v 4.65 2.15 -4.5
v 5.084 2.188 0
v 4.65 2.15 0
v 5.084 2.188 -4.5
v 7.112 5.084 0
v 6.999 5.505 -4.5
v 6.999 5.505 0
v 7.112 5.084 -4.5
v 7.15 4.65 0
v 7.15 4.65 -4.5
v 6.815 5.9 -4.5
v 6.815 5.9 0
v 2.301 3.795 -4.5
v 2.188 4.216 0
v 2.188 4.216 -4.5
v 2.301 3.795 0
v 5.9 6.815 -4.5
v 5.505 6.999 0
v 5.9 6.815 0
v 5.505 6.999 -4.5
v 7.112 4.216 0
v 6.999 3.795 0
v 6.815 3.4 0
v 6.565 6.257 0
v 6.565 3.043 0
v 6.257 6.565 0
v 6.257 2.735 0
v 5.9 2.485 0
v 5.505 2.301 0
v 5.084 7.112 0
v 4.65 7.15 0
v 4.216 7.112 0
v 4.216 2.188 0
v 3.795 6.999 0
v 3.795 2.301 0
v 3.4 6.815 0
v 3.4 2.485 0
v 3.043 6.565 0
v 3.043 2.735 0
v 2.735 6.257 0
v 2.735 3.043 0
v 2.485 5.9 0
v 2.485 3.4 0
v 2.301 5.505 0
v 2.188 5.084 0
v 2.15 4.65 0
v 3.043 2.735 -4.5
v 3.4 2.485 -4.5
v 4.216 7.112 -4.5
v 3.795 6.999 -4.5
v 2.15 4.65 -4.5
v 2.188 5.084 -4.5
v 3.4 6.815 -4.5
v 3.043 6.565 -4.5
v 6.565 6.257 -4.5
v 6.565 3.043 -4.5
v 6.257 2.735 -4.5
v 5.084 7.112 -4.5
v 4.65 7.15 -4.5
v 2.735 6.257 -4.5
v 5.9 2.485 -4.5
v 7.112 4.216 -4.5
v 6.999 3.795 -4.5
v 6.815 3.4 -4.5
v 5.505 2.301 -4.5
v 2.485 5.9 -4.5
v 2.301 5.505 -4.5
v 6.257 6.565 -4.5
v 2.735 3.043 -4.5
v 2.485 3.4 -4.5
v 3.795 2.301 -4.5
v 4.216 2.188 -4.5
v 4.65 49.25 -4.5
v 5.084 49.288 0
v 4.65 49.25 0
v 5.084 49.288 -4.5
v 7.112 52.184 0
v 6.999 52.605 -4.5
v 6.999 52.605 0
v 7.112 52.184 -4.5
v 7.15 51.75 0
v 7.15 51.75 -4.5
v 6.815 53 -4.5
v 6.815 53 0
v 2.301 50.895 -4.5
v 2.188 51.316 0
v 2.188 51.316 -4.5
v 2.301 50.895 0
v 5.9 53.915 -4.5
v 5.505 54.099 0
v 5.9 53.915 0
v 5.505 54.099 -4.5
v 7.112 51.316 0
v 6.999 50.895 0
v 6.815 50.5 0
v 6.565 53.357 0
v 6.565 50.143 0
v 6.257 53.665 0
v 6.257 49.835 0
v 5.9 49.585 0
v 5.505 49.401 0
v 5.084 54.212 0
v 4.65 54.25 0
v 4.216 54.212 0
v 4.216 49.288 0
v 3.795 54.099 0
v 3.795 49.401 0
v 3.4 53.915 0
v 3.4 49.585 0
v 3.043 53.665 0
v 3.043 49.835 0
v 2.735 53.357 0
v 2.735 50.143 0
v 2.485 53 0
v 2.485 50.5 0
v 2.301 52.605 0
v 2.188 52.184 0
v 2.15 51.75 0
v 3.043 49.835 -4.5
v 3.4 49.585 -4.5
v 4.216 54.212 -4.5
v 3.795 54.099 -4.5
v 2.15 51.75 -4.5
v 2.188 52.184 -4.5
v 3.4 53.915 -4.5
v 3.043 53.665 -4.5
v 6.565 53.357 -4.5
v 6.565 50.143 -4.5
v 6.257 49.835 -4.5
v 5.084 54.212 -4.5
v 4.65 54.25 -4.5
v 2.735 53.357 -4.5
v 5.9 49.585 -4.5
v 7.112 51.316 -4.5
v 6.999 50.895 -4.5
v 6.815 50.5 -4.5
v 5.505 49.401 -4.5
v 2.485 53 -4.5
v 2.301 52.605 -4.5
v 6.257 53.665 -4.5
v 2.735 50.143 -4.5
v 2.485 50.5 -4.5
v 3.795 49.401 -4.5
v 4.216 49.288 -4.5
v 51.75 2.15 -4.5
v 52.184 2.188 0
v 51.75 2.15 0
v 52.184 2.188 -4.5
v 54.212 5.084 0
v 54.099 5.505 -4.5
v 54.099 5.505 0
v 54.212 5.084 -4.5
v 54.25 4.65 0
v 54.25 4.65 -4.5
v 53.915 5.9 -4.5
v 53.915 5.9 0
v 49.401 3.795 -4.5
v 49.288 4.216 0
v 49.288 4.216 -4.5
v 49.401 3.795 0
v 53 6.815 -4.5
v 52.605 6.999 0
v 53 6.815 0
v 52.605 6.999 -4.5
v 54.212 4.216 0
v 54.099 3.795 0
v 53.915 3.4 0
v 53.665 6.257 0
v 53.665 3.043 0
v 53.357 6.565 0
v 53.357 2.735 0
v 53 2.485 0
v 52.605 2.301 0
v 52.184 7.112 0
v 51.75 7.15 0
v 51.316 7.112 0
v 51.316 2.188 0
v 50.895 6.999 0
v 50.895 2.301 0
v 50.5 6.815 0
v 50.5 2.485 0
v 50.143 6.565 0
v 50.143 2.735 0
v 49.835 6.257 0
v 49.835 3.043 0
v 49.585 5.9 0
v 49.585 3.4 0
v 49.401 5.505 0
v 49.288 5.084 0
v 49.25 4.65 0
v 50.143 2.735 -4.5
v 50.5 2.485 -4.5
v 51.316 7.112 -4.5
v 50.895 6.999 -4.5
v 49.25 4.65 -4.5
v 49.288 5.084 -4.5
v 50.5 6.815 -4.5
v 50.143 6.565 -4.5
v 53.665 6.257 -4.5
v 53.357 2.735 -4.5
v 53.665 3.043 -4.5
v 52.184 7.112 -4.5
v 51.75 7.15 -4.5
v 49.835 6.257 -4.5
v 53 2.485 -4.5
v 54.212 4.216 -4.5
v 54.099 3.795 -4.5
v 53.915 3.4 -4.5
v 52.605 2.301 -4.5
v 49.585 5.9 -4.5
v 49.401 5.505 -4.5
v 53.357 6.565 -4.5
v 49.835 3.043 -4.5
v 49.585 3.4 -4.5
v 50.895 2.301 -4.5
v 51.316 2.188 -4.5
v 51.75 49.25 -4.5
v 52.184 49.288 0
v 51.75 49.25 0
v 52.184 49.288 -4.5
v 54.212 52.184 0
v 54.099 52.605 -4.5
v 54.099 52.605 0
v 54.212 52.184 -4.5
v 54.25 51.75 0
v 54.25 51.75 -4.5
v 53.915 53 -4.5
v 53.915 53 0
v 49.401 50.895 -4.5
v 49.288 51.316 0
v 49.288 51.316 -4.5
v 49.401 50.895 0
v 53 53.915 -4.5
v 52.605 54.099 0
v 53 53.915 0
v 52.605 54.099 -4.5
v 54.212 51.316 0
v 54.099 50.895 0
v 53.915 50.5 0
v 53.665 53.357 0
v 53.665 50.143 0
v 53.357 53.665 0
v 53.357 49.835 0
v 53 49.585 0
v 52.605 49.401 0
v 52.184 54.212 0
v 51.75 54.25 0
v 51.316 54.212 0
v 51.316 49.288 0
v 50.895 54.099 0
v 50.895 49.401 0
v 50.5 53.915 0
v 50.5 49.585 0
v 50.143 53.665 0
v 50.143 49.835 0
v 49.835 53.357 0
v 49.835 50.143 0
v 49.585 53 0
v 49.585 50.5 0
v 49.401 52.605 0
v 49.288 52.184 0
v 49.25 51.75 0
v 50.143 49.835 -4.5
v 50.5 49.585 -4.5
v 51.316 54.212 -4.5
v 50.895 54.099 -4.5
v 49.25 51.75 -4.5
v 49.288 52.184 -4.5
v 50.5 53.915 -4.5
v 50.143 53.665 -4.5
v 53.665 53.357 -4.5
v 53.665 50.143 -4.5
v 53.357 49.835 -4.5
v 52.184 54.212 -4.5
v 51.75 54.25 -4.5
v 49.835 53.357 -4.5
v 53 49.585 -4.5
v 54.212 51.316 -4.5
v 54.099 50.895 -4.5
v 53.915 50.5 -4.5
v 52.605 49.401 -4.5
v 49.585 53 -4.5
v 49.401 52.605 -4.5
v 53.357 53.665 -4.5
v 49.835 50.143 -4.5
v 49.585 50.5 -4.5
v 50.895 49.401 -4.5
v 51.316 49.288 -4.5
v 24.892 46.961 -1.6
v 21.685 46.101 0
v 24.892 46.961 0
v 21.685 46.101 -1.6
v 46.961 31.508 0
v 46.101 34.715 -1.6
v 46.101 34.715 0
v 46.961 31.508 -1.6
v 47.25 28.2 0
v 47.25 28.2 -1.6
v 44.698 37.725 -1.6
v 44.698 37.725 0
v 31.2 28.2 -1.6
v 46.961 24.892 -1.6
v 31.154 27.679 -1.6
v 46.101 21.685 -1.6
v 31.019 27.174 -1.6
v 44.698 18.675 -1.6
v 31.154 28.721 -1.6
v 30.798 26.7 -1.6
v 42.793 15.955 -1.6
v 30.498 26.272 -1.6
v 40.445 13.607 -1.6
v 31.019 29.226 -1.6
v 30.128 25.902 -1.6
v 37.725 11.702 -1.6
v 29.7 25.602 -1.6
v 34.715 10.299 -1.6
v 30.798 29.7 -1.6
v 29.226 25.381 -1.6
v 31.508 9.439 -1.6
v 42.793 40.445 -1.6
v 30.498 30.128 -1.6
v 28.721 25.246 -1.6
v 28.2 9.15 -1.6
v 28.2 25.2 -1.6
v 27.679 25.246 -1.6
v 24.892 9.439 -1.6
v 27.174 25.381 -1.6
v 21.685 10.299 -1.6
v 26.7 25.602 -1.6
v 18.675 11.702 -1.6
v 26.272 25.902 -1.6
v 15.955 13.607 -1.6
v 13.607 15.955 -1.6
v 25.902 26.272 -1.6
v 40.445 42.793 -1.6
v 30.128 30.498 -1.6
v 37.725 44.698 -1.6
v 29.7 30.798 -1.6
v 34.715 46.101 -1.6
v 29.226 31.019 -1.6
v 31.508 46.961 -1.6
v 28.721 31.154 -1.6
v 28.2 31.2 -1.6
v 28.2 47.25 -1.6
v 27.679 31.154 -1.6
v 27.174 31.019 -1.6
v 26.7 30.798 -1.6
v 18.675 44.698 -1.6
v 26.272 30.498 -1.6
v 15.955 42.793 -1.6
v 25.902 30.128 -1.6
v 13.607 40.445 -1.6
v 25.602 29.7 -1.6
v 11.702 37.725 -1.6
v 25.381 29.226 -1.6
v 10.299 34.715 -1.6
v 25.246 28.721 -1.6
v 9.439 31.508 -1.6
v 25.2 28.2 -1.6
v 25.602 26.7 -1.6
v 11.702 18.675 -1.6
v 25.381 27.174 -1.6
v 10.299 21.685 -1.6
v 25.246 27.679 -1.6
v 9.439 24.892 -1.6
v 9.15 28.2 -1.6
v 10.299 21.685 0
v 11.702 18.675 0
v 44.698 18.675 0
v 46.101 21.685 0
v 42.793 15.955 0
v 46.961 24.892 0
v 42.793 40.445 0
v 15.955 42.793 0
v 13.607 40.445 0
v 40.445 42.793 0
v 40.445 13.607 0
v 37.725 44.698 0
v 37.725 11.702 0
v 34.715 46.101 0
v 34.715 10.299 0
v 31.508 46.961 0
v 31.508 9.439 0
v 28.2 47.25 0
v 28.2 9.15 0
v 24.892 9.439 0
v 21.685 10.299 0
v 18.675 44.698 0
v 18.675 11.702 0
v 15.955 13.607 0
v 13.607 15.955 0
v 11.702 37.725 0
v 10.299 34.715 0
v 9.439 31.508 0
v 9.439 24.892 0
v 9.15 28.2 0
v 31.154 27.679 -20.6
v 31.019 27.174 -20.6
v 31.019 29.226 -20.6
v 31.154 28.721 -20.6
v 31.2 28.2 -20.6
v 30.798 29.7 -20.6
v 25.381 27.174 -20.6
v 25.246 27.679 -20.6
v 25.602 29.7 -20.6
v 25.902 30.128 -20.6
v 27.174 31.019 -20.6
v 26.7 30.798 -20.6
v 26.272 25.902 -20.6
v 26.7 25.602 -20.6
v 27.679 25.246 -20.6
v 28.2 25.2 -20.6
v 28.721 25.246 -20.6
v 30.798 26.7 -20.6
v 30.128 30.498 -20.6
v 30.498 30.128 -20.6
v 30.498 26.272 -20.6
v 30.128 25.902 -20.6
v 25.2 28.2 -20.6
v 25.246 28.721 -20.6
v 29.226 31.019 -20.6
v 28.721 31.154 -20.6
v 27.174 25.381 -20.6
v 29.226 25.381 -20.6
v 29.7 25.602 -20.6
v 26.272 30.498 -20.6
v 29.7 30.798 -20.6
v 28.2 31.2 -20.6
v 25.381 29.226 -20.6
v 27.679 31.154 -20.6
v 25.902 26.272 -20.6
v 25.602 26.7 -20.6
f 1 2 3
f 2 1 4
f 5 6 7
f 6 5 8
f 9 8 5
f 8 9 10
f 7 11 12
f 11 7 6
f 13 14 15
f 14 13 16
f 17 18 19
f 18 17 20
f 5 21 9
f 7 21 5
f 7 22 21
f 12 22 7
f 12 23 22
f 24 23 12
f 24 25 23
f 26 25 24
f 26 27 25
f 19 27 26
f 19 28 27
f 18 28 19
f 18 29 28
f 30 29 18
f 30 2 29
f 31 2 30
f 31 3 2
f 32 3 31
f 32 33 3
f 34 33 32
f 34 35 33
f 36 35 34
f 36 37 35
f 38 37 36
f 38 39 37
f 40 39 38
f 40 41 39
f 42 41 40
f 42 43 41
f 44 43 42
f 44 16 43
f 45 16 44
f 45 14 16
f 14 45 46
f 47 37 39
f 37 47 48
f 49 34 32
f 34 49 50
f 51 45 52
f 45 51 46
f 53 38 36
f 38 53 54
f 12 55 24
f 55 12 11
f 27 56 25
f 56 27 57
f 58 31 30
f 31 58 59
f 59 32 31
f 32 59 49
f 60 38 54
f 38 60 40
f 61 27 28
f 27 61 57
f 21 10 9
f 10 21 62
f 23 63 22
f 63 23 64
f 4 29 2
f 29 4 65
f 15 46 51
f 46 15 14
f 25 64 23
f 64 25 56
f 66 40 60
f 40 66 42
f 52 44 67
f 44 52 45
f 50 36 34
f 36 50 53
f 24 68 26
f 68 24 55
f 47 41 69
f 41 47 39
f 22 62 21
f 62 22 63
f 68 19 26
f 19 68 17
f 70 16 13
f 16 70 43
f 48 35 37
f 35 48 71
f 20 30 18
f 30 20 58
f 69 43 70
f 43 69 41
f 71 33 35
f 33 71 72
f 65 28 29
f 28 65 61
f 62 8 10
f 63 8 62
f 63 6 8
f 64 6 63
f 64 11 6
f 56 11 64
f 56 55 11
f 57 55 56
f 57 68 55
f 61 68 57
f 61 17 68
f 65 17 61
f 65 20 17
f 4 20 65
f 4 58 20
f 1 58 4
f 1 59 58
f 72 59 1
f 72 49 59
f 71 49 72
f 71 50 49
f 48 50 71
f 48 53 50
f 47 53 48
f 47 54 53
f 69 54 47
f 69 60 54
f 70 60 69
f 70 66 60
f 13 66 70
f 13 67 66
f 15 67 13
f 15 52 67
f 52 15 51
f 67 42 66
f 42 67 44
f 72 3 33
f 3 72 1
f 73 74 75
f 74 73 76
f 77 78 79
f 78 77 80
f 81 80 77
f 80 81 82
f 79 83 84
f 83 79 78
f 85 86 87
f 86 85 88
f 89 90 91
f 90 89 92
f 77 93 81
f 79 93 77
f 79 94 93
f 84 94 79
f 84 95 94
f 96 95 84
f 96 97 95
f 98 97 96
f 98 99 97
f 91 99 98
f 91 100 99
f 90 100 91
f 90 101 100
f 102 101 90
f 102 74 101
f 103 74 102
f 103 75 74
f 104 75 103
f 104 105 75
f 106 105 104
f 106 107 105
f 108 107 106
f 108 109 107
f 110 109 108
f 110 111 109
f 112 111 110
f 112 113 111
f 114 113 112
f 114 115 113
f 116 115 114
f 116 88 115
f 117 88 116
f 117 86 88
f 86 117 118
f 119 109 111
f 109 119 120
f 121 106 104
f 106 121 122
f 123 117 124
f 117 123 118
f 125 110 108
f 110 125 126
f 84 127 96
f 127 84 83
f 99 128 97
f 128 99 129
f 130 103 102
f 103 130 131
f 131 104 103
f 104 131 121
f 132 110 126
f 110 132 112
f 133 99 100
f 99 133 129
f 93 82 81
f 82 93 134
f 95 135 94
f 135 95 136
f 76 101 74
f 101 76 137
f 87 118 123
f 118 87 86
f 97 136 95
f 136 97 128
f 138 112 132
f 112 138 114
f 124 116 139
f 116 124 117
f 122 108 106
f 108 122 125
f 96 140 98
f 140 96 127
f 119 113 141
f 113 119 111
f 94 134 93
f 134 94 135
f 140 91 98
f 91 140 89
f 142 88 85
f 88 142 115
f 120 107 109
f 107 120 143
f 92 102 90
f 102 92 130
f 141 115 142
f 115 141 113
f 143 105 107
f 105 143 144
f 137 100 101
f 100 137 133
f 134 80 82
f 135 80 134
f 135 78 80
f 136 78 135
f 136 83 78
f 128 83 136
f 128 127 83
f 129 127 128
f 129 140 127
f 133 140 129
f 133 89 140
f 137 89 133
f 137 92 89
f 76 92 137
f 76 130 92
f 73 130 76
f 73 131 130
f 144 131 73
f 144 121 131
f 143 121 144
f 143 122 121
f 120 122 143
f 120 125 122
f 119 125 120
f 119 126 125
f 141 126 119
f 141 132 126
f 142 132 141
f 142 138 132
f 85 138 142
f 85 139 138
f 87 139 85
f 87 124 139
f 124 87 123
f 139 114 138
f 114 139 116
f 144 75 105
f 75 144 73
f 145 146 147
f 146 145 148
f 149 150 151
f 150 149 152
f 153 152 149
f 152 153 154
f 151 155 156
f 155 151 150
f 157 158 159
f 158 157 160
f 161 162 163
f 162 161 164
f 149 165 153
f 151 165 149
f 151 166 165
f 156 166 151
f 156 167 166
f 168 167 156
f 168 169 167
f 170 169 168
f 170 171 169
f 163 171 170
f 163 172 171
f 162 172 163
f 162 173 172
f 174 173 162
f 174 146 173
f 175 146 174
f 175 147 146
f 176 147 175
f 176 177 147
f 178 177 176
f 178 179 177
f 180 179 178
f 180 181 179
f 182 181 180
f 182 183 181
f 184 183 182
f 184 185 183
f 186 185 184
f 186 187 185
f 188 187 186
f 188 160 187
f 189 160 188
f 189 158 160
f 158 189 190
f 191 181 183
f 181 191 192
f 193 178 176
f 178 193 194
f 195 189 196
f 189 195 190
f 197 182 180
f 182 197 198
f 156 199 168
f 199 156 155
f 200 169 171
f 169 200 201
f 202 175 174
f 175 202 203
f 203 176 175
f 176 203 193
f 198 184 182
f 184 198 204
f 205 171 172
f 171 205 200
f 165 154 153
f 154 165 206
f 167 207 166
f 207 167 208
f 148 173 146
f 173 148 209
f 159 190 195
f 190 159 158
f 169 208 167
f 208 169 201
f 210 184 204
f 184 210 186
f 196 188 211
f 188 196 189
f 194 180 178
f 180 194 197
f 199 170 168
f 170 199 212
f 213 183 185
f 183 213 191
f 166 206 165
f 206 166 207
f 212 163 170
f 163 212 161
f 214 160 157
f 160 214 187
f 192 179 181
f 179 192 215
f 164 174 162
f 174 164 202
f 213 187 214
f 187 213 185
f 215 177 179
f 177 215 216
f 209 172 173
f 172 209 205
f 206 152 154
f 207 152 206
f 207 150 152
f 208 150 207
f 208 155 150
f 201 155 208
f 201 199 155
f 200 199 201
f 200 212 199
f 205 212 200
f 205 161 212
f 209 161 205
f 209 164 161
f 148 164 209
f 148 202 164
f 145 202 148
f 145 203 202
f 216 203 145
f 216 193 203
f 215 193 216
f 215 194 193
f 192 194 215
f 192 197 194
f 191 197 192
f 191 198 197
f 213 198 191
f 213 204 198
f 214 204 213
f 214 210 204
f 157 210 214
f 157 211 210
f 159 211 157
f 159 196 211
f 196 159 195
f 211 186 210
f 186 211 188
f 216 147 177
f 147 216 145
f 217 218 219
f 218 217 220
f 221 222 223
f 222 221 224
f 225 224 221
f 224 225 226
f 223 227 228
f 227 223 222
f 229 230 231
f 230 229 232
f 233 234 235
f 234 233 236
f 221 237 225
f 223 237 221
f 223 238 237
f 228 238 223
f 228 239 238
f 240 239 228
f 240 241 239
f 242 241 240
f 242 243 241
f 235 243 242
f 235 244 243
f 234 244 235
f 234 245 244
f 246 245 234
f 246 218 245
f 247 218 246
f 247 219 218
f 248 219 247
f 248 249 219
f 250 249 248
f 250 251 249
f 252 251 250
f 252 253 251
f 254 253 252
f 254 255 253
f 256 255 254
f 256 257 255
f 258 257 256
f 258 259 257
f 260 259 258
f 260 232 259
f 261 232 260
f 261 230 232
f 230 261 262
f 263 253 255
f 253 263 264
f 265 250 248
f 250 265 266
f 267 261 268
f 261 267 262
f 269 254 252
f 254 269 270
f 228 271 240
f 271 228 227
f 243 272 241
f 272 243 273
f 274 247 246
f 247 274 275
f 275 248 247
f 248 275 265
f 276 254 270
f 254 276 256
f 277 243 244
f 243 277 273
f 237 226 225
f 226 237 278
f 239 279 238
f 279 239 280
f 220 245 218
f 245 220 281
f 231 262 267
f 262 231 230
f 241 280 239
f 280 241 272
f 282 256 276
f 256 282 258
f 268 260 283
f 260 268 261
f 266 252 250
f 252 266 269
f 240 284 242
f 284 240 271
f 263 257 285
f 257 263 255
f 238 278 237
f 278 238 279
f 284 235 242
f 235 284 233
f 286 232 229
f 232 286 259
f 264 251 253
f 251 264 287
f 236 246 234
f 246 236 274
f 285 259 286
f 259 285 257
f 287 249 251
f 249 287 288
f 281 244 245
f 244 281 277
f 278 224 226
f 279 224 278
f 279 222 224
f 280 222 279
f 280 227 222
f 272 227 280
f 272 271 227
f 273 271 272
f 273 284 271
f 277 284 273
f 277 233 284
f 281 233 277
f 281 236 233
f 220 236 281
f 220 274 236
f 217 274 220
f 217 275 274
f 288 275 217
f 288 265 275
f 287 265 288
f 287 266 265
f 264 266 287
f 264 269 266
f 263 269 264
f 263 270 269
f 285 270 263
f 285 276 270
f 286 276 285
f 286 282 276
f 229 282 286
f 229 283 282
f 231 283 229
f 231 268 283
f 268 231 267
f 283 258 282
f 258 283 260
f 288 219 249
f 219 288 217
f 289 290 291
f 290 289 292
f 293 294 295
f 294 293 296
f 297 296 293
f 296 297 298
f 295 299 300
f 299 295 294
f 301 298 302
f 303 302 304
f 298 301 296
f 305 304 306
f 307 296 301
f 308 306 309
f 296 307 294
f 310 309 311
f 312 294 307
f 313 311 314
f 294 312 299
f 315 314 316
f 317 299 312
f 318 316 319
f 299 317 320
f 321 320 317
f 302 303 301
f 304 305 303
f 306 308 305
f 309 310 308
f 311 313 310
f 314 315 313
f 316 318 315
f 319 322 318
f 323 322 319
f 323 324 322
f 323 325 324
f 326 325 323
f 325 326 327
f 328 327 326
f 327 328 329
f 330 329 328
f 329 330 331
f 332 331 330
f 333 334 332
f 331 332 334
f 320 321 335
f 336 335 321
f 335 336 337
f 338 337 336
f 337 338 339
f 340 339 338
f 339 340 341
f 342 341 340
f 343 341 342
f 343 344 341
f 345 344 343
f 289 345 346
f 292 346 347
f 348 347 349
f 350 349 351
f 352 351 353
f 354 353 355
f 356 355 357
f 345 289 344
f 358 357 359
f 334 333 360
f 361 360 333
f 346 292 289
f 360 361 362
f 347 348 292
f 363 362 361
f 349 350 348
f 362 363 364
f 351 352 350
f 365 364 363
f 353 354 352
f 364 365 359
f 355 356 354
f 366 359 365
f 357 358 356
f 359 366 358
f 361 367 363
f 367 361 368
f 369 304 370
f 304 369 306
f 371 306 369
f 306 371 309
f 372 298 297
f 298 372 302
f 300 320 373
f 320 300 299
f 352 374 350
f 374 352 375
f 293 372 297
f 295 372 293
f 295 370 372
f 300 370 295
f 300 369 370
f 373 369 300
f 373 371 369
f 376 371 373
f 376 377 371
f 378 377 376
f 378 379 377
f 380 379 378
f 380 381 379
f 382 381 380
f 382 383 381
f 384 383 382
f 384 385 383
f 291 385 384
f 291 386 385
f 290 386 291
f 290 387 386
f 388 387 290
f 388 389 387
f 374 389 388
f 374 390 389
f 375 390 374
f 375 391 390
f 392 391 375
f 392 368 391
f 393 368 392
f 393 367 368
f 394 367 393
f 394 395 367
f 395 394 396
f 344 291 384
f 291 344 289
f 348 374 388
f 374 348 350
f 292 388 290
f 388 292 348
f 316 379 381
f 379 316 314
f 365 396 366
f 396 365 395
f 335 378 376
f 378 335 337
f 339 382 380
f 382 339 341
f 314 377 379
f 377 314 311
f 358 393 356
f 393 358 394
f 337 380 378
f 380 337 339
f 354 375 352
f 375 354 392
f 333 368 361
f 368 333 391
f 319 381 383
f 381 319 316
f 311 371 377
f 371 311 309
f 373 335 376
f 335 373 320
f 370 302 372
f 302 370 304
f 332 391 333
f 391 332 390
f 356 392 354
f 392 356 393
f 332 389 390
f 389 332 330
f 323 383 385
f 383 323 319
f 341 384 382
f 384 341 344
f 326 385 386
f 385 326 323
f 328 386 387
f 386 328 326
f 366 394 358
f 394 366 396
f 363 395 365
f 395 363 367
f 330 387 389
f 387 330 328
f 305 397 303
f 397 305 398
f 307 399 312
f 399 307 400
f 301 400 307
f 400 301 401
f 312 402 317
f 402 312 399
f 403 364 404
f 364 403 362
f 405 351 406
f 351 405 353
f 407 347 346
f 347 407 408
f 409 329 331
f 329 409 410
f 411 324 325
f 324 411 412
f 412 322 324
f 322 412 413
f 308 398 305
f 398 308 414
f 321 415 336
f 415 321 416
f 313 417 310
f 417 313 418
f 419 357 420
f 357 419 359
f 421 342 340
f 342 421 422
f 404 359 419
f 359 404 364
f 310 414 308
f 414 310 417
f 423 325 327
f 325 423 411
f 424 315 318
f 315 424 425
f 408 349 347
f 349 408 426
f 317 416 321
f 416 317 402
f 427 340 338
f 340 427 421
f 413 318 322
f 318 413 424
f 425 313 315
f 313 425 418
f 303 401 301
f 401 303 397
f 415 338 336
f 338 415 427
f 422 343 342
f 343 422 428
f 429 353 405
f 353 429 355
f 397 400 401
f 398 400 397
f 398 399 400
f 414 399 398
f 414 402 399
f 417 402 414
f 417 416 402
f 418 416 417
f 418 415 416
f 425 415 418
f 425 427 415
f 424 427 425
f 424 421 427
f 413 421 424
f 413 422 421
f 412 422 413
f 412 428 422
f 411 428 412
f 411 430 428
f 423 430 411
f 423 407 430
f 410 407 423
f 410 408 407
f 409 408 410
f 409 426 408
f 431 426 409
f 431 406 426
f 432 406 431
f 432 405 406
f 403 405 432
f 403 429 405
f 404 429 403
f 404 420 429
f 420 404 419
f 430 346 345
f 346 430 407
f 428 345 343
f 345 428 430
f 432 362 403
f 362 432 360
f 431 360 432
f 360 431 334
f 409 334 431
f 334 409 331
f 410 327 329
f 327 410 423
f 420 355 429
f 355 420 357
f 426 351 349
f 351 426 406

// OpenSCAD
// file: posts.scad
/* Developed by Alex Grutter */

$fn = 36;

four_posts_with_supports(10, 3, 2, 25, 50, 5, 1, [0,0,0,0], 1, true);

module four_posts(post_height, post_outer_diameter, post_inner_diameter, post_spacing_width, post_spacing_length){
    difference()
    {
		/* Outer part */
		union()
		{
            translate([0, 0, 0])
            {
                cylinder(h = post_height, d = post_outer_diameter);
            }
            translate([0, post_spacing_length + 0, 0])
            {
                cylinder(h = post_height, d = post_outer_diameter);
            }
            translate([post_spacing_width + 0, 0, 0])
            {
                cylinder(h = post_height, d = post_outer_diameter);
            }
            translate([post_spacing_width + 0, post_spacing_length + 0, 0])
            {
                cylinder(h = post_height, d = post_outer_diameter);
            }
		}
		/* Inner hole */
        union()
        {
            translate([0, 0, -1])
            {
                cylinder(h = post_height+2, d = post_inner_diameter);
            }
            translate([0, post_spacing_length + 0, -1])
            {
                cylinder(h = post_height+2, d = post_inner_diameter);
            }
            translate([post_spacing_width + 0, 0, -1])
            {
                cylinder(h = post_height+2, d = post_inner_diameter);
            }
            translate([post_spacing_width + 0, post_spacing_length + 0, -1])
            {
                cylinder(h = post_height+2, d = post_inner_diameter);
            }
        }
	}
};

module four_posts_with_supports(post_height, post_outer_diameter, post_inner_diameter, post_spacing_width, post_spacing_length, support_diameter, support_count, support_start_angle, support_thickness, flip){
    difference()
    {
		/* Outer part */
		union()
		{
            translate([0, 0, 0])
            {
                cylinder(h = post_height, d = post_outer_diameter);
				for(support = [0 : support_count])
				{
					if(flip)
					{
						translate([0, 0, post_height])
						rotate([support_start_angle[0] + ( support * (360 / support_count)),90,0])
						translate([0, 0, -(support_thickness / 2)])
						linear_extrude(support_thickness)
						polygon([[post_height, (post_inner_diameter / 2)],[0, (post_inner_diameter / 2)],[0,(support_diameter / 2)]], [[0,1,2]]);
					}
					else
					{
						rotate([support_start_angle[0] + ( support * (360 / support_count)),-90,0])
						translate([0, 0, -(support_thickness / 2)])
						linear_extrude(support_thickness)
						polygon([[post_height, (post_inner_diameter / 2)],[0, (post_inner_diameter / 2)],[0, (support_diameter / 2)]], [[0,1,2]]);
					}
				}
            }
            translate([0, post_spacing_length + 0, 0])
            {
                cylinder(h = post_height, d = post_outer_diameter);
				for(support = [0 : support_count])
				{
					if(flip)
					{
						translate([0, 0, post_height])
						rotate([support_start_angle[1] + ( support * (360 / support_count)),90,0])
						translate([0, 0, -(support_thickness / 2)])
						linear_extrude(support_thickness)
						polygon([[post_height, (post_inner_diameter / 2)],[0, (post_inner_diameter / 2)],[0,(support_diameter / 2)]], [[0,1,2]]);
					}
					else
					{
						rotate([support_start_angle[1] + ( support * (360 / support_count)),-90,0])
						translate([0, 0, -(support_thickness / 2)])
						linear_extrude(support_thickness)
						polygon([[post_height, (post_inner_diameter / 2)],[0, (post_inner_diameter / 2)],[0,(support_diameter / 2)]], [[0,1,2]]);
					}
				}
            }
            translate([post_spacing_width + 0, 0, 0])
            {
                cylinder(h = post_height, d = post_outer_diameter);
				for(support = [0 : support_count])
				{
					if(flip)
					{
						translate([0, 0, post_height])
						rotate([support_start_angle[2] + ( support * (360 / support_count)),90,0])
						translate([0, 0, -(support_thickness / 2)])
						linear_extrude(support_thickness)
						polygon([[post_height, (post_inner_diameter / 2)],[0, (post_inner_diameter / 2)],[0,(support_diameter / 2)]], [[0,1,2]]);
					}
					else
					{
						rotate([support_start_angle[2] + ( support * (360 / support_count)),-90,0])
						translate([0, 0, -(support_thickness / 2)])
						linear_extrude(support_thickness)
						polygon([[post_height, (post_inner_diameter / 2)],[0, (post_inner_diameter / 2)],[0,(support_diameter / 2)]], [[0,1,2]]);
					}
				}
            }
            translate([post_spacing_width + 0, post_spacing_length + 0, 0])
            {
                cylinder(h = post_height, d = post_outer_diameter);
				for(support = [0 : support_count])
				{
					if(flip)
					{
						translate([0, 0, post_height])
						rotate([support_start_angle[3] + ( support * (360 / support_count)),90,0])
						translate([0, 0, -(support_thickness / 2)])
						linear_extrude(support_thickness)
						polygon([[post_height, (post_inner_diameter / 2)],[0, (post_inner_diameter / 2)],[0,(support_diameter / 2)]], [[0,1,2]]);
					}
					else
					{
						rotate([support_start_angle[3] + ( support * (360 / support_count)),-90,0])
						translate([0, 0, -(support_thickness / 2)])
						linear_extrude(support_thickness)
						polygon([[post_height, (post_inner_diameter / 2)],[0, (post_inner_diameter / 2)],[0,(support_diameter / 2)]], [[0,1,2]]);
					}
				}
            }
		}
        
		/* Inner hole */
        union()
        {
            translate([0, 0, -1])
            {
                cylinder(h = post_height+2, d = post_inner_diameter);
            }
            translate([0, post_spacing_length + 0, -1])
            {
                cylinder(h = post_height+2, d = post_inner_diameter);
            }
            translate([post_spacing_width + 0, 0, -1])
            {
                cylinder(h = post_height+2, d = post_inner_diameter);
            }
            translate([post_spacing_width + 0, post_spacing_length + 0, -1])
            {
                cylinder(h = post_height+2, d = post_inner_diameter);
            }
        }
	}
};
// main file
use <posts.scad>

/* Examples for viewing */
nema_23_holes();

module nema_23_holes()
{
    /* Hole parameters */
    mount_hole_depth            = 4.5;
    hole_inner_diameter         = 5;
    
    /* Based on drawings */
    total_width                 = 56.4;
    mount_hole_spacing          = 47.1;
    
    /* Calculated offset from edge to start of hole */
    mount_edge_offset           = (total_width - mount_hole_spacing) / 2;
    
    /* Shaft baseplate circular offset clearance */
    shaft_baseplate_diameter    = 38.1;
    shaft_baseplate_depth       = 1.6;
    shaft_diameter              = 6;
    shaft_length                = 20.6;
    
    /* Length positioning parameters */
    hole1_offset_length         = mount_edge_offset;
    hole2_offset_length         = hole1_offset_length;
    hole3_offset_length         = mount_edge_offset + mount_hole_spacing;
    hole4_offset_length         = hole3_offset_length;
    hole5_offset_length         = total_width / 2;
    
    /* Width positioning parameters */
    hole1_offset_width          = mount_edge_offset + mount_hole_spacing;
    hole2_offset_width          = mount_edge_offset;
    hole3_offset_width          = hole1_offset_width;
    hole4_offset_width          = hole2_offset_width;
    hole5_offset_width          = total_width / 2;
    
    /* Hole 1: */
    translate([hole1_offset_length, total_width - hole1_offset_width, -mount_hole_depth])
    four_posts(mount_hole_depth, hole_inner_diameter, 0, 0, 0);
    
    /* Hole 2: */
    translate([hole2_offset_length, total_width - hole2_offset_width, -mount_hole_depth])
    four_posts(mount_hole_depth, hole_inner_diameter, 0, 0, 0);
        
    /* Hole 3: */
    translate([hole3_offset_length, total_width - hole3_offset_width, -mount_hole_depth])
    four_posts(mount_hole_depth, hole_inner_diameter, 0, 0, 0);
    
    /* Hole 4: */
    translate([hole4_offset_length, total_width - hole4_offset_width, -mount_hole_depth])
    four_posts(mount_hole_depth, hole_inner_diameter, 0, 0, 0);

    /* Hole 5: */
    translate([hole5_offset_length, total_width - hole5_offset_width, -shaft_baseplate_depth])
    four_posts(shaft_baseplate_depth, shaft_baseplate_diameter, 0, 0, 0);

    /* Hole 6: */
    translate([hole5_offset_length, total_width - hole5_offset_width, -shaft_length])
    four_posts(shaft_length, shaft_diameter, 0, 0, 0);
}
